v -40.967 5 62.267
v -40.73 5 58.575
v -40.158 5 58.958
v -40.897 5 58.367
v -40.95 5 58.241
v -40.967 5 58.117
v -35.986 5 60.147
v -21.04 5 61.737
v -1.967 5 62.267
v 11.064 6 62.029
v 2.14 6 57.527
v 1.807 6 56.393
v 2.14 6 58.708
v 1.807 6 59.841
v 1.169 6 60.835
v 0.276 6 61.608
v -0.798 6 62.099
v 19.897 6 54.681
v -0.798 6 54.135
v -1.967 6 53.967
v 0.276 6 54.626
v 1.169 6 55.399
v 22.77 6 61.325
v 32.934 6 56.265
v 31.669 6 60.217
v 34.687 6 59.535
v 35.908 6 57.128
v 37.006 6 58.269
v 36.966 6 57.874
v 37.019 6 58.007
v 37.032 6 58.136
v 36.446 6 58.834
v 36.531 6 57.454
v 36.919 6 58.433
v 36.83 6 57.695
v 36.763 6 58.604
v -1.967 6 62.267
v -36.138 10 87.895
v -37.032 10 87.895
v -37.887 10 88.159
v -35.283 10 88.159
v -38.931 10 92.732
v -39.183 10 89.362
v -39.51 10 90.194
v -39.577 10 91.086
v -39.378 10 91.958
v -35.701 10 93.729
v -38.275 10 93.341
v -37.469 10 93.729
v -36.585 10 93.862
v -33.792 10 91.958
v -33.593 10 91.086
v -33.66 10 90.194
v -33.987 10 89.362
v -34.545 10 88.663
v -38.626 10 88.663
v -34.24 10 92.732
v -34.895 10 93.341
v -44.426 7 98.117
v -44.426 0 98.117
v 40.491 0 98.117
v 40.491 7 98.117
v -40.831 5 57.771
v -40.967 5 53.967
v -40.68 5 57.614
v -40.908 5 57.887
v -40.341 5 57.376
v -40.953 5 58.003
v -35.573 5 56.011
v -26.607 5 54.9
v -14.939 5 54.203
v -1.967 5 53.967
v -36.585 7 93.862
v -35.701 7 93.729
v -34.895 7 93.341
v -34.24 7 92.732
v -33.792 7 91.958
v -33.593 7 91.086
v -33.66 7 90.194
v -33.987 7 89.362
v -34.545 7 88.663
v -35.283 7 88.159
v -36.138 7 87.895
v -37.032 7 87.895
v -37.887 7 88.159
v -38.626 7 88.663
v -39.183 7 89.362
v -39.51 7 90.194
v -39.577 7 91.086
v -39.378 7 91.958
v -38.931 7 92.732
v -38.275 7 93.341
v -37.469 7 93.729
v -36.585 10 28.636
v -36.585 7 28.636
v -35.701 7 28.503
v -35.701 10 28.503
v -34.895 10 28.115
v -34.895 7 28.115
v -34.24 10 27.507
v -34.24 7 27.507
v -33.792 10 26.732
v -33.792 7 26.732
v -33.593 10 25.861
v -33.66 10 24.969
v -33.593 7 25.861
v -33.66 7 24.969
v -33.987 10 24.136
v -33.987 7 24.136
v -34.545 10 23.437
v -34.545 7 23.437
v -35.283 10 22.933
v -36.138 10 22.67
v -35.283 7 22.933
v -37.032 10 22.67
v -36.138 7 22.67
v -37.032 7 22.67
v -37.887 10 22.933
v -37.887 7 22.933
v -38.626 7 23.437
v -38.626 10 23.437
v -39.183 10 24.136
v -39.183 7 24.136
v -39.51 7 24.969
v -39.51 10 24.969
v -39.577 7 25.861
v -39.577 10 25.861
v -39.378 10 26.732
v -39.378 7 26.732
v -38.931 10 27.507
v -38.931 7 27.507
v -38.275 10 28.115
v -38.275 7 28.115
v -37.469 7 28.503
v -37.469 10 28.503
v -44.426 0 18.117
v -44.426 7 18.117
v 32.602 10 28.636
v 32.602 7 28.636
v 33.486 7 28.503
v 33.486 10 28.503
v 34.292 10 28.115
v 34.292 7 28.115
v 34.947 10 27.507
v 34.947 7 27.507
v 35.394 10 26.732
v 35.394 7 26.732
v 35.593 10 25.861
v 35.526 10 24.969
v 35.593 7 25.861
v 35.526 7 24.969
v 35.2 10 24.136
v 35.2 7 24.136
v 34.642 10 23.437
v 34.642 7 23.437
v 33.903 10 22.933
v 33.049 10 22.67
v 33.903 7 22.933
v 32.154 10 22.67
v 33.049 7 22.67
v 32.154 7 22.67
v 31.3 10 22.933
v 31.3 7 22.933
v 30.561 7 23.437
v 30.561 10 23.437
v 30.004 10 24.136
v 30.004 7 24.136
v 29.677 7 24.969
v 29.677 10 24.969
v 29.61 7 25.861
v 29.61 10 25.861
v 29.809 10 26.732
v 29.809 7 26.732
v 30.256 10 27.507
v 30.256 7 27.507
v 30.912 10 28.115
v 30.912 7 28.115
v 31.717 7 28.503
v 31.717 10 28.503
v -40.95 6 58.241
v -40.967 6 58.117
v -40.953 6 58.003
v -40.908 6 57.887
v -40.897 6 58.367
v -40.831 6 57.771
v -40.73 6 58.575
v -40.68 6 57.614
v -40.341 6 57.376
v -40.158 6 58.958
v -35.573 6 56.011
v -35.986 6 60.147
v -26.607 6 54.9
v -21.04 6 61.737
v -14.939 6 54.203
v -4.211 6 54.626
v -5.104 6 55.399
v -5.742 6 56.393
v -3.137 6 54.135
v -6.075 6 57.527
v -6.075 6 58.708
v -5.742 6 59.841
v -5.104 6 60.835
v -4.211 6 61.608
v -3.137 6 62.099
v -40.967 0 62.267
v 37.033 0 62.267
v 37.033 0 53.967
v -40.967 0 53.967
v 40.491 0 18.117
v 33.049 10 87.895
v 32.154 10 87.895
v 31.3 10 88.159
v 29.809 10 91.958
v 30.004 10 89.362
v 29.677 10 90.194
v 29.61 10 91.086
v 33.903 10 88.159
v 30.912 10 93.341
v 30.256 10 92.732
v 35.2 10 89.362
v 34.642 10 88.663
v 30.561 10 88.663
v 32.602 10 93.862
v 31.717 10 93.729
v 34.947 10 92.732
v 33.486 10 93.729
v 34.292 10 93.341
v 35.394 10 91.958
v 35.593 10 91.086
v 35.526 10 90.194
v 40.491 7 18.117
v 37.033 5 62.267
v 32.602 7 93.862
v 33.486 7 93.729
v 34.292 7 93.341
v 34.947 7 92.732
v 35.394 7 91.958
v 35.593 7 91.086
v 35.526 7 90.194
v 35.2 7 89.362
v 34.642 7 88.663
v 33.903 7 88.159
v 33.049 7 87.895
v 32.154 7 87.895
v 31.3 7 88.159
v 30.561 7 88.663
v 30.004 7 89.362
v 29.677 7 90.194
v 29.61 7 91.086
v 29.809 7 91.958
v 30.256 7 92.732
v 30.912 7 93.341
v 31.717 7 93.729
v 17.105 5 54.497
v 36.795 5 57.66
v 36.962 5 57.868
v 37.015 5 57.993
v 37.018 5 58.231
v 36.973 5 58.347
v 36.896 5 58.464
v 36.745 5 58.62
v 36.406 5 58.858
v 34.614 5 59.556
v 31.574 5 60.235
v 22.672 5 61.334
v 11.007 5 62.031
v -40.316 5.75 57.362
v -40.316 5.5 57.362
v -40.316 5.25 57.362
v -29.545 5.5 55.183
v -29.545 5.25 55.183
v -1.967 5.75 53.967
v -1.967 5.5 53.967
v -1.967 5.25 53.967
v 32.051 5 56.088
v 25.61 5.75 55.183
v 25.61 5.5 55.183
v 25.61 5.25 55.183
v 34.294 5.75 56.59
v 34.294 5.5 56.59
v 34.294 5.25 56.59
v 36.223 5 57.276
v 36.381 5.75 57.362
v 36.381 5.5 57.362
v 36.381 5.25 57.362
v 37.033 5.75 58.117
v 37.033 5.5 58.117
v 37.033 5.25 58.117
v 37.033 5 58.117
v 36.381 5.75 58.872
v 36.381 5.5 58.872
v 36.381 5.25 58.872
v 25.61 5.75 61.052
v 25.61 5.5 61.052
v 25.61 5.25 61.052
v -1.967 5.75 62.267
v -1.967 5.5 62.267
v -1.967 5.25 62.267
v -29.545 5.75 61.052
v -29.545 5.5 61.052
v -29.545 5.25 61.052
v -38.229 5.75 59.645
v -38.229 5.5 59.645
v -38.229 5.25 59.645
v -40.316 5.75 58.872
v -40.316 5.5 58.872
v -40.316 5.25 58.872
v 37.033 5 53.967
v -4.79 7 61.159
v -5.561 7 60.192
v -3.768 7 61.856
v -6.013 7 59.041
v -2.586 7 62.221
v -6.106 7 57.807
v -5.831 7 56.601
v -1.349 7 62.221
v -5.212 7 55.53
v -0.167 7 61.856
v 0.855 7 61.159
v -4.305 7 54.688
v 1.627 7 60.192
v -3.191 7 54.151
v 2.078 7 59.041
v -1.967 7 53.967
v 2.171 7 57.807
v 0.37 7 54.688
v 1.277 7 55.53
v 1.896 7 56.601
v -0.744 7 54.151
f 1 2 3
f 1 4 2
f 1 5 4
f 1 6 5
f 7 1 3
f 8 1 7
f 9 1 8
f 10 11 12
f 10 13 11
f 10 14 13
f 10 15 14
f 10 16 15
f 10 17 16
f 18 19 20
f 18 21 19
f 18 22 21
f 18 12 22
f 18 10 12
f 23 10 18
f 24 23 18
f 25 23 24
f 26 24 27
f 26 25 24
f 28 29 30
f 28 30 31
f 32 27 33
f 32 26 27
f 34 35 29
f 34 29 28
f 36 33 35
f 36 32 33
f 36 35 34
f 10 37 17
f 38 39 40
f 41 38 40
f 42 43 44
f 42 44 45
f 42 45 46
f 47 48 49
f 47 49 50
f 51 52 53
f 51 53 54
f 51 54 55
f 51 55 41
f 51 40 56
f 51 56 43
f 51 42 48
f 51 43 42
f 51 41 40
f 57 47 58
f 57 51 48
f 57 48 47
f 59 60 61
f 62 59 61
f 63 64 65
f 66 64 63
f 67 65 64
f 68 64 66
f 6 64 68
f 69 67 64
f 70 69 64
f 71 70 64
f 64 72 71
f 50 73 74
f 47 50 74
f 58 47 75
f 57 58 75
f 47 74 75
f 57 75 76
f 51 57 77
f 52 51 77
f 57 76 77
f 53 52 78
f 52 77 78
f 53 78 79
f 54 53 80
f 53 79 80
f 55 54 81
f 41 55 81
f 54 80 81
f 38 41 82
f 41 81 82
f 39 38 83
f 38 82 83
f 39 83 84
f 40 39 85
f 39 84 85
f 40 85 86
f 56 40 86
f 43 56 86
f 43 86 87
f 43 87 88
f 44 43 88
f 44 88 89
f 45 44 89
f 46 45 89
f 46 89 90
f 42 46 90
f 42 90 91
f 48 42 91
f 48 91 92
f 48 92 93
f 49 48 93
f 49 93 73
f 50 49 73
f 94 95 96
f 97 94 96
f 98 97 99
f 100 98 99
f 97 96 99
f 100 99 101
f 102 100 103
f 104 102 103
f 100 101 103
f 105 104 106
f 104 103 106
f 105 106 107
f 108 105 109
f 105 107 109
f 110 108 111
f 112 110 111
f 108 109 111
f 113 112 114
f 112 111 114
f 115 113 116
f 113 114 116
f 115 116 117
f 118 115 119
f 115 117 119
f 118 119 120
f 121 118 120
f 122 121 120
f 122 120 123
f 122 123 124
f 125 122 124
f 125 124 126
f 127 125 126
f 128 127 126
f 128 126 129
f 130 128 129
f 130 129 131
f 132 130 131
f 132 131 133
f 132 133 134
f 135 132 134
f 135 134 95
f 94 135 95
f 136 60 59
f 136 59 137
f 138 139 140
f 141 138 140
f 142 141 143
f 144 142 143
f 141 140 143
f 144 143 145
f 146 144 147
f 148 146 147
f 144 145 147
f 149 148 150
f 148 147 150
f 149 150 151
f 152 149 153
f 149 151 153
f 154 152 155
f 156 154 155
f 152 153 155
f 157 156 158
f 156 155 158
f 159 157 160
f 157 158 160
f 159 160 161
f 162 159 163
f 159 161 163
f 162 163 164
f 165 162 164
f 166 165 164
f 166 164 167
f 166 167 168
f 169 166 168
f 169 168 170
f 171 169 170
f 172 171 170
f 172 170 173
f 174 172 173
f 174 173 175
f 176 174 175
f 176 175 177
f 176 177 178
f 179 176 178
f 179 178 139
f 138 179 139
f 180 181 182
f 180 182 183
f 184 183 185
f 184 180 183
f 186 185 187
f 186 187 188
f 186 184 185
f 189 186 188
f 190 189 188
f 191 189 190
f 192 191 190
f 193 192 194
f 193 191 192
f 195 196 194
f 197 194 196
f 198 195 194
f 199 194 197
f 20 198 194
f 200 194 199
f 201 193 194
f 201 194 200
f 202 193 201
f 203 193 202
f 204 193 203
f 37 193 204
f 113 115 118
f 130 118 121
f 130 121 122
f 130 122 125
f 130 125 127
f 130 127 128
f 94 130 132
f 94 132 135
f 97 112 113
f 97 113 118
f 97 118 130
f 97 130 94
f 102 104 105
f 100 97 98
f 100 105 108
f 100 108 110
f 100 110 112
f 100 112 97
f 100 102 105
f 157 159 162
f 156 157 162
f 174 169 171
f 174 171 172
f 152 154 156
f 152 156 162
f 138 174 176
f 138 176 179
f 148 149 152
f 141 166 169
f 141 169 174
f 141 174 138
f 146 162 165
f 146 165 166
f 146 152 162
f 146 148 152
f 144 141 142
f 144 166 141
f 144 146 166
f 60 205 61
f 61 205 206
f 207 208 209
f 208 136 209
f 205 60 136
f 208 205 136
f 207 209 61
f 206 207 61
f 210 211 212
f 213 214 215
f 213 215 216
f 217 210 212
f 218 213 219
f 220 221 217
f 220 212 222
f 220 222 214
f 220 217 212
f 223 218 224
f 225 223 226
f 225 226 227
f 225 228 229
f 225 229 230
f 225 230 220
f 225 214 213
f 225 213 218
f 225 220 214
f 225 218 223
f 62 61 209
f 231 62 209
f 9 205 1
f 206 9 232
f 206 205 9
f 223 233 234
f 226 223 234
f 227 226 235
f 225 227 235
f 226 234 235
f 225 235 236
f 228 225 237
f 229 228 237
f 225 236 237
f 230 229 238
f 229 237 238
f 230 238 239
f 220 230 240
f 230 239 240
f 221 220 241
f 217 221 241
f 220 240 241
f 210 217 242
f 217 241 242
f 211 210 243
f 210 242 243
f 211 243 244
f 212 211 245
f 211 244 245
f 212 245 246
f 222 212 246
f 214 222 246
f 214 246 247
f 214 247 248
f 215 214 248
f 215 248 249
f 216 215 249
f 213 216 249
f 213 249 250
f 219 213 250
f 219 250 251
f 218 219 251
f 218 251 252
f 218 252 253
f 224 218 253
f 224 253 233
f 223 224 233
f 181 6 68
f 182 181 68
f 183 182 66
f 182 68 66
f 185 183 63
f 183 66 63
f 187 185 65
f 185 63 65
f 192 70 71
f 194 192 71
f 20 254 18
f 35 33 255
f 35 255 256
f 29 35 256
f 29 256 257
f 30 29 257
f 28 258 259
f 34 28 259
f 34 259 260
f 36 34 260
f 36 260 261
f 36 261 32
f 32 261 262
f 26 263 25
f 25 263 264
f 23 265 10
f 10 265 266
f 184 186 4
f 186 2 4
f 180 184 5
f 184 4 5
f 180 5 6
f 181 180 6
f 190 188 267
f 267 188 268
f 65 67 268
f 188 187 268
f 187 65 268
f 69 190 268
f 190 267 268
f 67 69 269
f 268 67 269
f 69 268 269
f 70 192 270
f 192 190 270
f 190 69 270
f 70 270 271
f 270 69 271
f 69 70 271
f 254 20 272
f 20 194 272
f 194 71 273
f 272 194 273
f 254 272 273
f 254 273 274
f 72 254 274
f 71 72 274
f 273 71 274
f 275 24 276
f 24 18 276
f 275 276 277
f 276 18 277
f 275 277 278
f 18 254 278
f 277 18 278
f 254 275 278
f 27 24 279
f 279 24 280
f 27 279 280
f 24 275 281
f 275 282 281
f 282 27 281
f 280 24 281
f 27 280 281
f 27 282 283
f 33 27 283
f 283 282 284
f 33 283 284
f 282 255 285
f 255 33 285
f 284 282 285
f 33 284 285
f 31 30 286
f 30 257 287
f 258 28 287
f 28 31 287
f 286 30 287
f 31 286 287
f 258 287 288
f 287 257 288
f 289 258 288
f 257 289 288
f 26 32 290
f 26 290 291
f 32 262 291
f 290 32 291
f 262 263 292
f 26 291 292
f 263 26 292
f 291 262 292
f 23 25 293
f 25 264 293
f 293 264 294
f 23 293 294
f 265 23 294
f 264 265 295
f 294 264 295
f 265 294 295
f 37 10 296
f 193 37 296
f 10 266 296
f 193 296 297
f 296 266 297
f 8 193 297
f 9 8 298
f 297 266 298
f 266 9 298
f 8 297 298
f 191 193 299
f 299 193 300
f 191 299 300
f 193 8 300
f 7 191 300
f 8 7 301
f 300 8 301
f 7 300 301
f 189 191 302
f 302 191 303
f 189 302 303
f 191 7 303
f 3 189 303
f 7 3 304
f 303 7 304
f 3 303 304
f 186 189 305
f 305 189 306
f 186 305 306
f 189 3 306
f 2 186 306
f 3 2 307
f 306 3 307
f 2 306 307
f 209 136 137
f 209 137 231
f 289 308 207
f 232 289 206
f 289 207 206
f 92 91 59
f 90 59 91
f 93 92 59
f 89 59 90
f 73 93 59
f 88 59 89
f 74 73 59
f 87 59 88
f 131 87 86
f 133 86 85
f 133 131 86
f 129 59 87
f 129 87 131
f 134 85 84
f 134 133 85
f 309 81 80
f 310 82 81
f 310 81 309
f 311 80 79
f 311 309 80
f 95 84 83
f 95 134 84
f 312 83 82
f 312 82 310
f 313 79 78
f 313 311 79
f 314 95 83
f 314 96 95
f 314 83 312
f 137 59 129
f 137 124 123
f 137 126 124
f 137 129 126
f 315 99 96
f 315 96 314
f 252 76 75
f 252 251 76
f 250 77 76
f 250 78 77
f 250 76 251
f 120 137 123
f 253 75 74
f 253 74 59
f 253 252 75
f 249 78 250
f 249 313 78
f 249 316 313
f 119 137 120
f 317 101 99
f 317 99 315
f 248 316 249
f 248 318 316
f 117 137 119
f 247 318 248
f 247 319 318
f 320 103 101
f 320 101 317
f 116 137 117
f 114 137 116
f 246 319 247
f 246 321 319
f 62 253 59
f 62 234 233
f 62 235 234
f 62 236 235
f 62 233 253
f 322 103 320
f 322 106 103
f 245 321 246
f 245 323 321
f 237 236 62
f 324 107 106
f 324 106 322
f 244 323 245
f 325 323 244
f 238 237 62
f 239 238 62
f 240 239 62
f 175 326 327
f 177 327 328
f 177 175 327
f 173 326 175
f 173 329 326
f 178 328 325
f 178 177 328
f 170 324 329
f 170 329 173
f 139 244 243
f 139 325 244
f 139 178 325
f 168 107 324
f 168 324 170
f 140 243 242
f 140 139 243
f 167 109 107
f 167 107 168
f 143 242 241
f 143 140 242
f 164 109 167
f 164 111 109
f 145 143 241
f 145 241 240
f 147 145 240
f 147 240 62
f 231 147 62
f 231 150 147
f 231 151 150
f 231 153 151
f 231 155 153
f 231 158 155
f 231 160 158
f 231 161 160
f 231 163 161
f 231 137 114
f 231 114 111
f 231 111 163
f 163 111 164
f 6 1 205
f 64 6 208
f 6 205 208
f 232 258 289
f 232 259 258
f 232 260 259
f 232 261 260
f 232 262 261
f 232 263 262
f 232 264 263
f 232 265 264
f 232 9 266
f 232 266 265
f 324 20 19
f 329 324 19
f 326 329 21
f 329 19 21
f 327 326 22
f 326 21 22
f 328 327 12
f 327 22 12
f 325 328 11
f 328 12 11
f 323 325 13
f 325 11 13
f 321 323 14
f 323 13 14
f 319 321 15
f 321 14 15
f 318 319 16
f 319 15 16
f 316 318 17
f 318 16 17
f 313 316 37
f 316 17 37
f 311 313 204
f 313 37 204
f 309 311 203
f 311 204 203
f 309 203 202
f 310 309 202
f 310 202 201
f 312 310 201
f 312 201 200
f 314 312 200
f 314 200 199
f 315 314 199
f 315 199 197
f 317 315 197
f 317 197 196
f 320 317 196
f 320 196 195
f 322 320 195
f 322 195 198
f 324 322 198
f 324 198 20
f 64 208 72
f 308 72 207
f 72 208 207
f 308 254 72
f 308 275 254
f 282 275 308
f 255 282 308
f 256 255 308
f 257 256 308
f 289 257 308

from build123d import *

# Parameters (mm, degrees)
SKETCH_4_W           = 84.916455131
SKETCH_4_H           = 80
SKETCH_4_R           = 3
EXTRUDE_1_DEPTH      = 7
EXTRUDE_2_DEPTH      = 3
EXTRUDE_2_DEPTH_BACK = 7
SKETCH_5_R           = 3
SKETCH_6_W           = 78
SKETCH_6_H           = 4.15
CUT_EXTRUDE_1_DEPTH  = 5
CUT_EXTRUDE_2_DEPTH  = 1
SKETCH_8_R           = 4.15
CUT_EXTRUDE_3_DEPTH  = 108.873135035


with BuildPart() as part:
    # 草图4 → 凸台-拉伸1 (new body)
    with BuildSketch(Plane(origin=(0, 0, 0), x_dir=(1, 0, 0), z_dir=(0, 1, 0))):
        with Locations((-1.967483917, -58.11712094)):
            Rectangle(SKETCH_4_W, SKETCH_4_H)
        with Locations(Location((-36.585071707, -25.636349073, 0), (0, 0, 270))):
            Circle(SKETCH_4_R, mode=Mode.SUBTRACT)
        with Locations(Location((32.601613083, -25.636349073, 0), (0, 0, 270))):
            Circle(SKETCH_4_R, mode=Mode.SUBTRACT)
        with Locations(Location((-36.585071707, -90.861964123, 0), (0, 0, 270))):
            Circle(SKETCH_4_R, mode=Mode.SUBTRACT)
        with Locations(Location((32.601613083, -90.861964123, 0), (0, 0, 270))):
            Circle(SKETCH_4_R, mode=Mode.SUBTRACT)
    extrude(amount=EXTRUDE_1_DEPTH)

    # 草图5 → 凸台-拉伸2 (add, two sides: drawn at the far end of the back side and taken through both)
    with BuildSketch(Plane(origin=(0, 7, 0), x_dir=(1, 0, 0), z_dir=(0, 1, 0)).offset(-EXTRUDE_2_DEPTH_BACK)):
        with Locations(Location((-36.585071707, -25.636349073, 0), (0, 0, 270))):
            Circle(SKETCH_5_R)
        with Locations(Location((32.601613083, -25.636349073, 0), (0, 0, 270))):
            Circle(SKETCH_5_R)
        with Locations(Location((-36.585071707, -90.861964123, 0), (0, 0, 270))):
            Circle(SKETCH_5_R)
        with Locations(Location((32.601613083, -90.861964123, 0), (0, 0, 270))):
            Circle(SKETCH_5_R)
    extrude(amount=EXTRUDE_2_DEPTH + EXTRUDE_2_DEPTH_BACK)

    # 草图6 → 切除-拉伸1 (cut)
    with BuildSketch(Plane.XZ):
        with Locations((-1.967483917, 60.19212094)):
            Rectangle(SKETCH_6_W, SKETCH_6_H)
        with Locations((-1.967483917, 56.04212094)):
            Rectangle(SKETCH_6_W, SKETCH_6_H)
    extrude(amount=-CUT_EXTRUDE_1_DEPTH, mode=Mode.SUBTRACT)

    # 草图7 → 切除-拉伸2 (cut)
    with BuildSketch(Plane.XZ.offset(-5)):
        with BuildLine():
            add(Edge.make_bspline(
                [(37.032516083, 58.11712094), (37.032516083, 62.26712094), (-1.967483917, 62.26712094), (-40.967483917, 62.26712094), (-40.967483917, 58.11712094)],
                knots=[3.141592654, 3.141592654, 3.141592654, 4.71238898, 4.71238898, 6.283185307, 6.283185307, 6.283185307], degree=2, weights=[1, 0.707106781, 1, 0.707106781, 1]))
            Line((-40.967483917, 58.11712094), (37.032516083, 58.11712094))
        make_face()
        with BuildLine():
            Line((37.032516083, 58.11712094), (-40.967483917, 58.11712094))
            add(Edge.make_bspline(
                [(-40.967483917, 58.11712094), (-40.967483917, 53.96712094), (-1.967483917, 53.96712094), (37.032516083, 53.96712094), (37.032516083, 58.11712094)],
                knots=[0, 0, 0, 1.570796327, 1.570796327, 3.141592654, 3.141592654, 3.141592654], degree=2, weights=[1, 0.707106781, 1, 0.707106781, 1]))
        make_face()
    extrude(amount=-CUT_EXTRUDE_2_DEPTH, mode=Mode.SUBTRACT)

    # 草图8 → 切除-拉伸3 (cut, through all)
    with BuildSketch(Plane.XZ.offset(-6)):
        with Locations(Location((-1.967483917, 58.11712094, 0), (0, 0, 270))):
            Circle(SKETCH_8_R)
    extrude(amount=-CUT_EXTRUDE_3_DEPTH, mode=Mode.SUBTRACT)


solid = part.part
